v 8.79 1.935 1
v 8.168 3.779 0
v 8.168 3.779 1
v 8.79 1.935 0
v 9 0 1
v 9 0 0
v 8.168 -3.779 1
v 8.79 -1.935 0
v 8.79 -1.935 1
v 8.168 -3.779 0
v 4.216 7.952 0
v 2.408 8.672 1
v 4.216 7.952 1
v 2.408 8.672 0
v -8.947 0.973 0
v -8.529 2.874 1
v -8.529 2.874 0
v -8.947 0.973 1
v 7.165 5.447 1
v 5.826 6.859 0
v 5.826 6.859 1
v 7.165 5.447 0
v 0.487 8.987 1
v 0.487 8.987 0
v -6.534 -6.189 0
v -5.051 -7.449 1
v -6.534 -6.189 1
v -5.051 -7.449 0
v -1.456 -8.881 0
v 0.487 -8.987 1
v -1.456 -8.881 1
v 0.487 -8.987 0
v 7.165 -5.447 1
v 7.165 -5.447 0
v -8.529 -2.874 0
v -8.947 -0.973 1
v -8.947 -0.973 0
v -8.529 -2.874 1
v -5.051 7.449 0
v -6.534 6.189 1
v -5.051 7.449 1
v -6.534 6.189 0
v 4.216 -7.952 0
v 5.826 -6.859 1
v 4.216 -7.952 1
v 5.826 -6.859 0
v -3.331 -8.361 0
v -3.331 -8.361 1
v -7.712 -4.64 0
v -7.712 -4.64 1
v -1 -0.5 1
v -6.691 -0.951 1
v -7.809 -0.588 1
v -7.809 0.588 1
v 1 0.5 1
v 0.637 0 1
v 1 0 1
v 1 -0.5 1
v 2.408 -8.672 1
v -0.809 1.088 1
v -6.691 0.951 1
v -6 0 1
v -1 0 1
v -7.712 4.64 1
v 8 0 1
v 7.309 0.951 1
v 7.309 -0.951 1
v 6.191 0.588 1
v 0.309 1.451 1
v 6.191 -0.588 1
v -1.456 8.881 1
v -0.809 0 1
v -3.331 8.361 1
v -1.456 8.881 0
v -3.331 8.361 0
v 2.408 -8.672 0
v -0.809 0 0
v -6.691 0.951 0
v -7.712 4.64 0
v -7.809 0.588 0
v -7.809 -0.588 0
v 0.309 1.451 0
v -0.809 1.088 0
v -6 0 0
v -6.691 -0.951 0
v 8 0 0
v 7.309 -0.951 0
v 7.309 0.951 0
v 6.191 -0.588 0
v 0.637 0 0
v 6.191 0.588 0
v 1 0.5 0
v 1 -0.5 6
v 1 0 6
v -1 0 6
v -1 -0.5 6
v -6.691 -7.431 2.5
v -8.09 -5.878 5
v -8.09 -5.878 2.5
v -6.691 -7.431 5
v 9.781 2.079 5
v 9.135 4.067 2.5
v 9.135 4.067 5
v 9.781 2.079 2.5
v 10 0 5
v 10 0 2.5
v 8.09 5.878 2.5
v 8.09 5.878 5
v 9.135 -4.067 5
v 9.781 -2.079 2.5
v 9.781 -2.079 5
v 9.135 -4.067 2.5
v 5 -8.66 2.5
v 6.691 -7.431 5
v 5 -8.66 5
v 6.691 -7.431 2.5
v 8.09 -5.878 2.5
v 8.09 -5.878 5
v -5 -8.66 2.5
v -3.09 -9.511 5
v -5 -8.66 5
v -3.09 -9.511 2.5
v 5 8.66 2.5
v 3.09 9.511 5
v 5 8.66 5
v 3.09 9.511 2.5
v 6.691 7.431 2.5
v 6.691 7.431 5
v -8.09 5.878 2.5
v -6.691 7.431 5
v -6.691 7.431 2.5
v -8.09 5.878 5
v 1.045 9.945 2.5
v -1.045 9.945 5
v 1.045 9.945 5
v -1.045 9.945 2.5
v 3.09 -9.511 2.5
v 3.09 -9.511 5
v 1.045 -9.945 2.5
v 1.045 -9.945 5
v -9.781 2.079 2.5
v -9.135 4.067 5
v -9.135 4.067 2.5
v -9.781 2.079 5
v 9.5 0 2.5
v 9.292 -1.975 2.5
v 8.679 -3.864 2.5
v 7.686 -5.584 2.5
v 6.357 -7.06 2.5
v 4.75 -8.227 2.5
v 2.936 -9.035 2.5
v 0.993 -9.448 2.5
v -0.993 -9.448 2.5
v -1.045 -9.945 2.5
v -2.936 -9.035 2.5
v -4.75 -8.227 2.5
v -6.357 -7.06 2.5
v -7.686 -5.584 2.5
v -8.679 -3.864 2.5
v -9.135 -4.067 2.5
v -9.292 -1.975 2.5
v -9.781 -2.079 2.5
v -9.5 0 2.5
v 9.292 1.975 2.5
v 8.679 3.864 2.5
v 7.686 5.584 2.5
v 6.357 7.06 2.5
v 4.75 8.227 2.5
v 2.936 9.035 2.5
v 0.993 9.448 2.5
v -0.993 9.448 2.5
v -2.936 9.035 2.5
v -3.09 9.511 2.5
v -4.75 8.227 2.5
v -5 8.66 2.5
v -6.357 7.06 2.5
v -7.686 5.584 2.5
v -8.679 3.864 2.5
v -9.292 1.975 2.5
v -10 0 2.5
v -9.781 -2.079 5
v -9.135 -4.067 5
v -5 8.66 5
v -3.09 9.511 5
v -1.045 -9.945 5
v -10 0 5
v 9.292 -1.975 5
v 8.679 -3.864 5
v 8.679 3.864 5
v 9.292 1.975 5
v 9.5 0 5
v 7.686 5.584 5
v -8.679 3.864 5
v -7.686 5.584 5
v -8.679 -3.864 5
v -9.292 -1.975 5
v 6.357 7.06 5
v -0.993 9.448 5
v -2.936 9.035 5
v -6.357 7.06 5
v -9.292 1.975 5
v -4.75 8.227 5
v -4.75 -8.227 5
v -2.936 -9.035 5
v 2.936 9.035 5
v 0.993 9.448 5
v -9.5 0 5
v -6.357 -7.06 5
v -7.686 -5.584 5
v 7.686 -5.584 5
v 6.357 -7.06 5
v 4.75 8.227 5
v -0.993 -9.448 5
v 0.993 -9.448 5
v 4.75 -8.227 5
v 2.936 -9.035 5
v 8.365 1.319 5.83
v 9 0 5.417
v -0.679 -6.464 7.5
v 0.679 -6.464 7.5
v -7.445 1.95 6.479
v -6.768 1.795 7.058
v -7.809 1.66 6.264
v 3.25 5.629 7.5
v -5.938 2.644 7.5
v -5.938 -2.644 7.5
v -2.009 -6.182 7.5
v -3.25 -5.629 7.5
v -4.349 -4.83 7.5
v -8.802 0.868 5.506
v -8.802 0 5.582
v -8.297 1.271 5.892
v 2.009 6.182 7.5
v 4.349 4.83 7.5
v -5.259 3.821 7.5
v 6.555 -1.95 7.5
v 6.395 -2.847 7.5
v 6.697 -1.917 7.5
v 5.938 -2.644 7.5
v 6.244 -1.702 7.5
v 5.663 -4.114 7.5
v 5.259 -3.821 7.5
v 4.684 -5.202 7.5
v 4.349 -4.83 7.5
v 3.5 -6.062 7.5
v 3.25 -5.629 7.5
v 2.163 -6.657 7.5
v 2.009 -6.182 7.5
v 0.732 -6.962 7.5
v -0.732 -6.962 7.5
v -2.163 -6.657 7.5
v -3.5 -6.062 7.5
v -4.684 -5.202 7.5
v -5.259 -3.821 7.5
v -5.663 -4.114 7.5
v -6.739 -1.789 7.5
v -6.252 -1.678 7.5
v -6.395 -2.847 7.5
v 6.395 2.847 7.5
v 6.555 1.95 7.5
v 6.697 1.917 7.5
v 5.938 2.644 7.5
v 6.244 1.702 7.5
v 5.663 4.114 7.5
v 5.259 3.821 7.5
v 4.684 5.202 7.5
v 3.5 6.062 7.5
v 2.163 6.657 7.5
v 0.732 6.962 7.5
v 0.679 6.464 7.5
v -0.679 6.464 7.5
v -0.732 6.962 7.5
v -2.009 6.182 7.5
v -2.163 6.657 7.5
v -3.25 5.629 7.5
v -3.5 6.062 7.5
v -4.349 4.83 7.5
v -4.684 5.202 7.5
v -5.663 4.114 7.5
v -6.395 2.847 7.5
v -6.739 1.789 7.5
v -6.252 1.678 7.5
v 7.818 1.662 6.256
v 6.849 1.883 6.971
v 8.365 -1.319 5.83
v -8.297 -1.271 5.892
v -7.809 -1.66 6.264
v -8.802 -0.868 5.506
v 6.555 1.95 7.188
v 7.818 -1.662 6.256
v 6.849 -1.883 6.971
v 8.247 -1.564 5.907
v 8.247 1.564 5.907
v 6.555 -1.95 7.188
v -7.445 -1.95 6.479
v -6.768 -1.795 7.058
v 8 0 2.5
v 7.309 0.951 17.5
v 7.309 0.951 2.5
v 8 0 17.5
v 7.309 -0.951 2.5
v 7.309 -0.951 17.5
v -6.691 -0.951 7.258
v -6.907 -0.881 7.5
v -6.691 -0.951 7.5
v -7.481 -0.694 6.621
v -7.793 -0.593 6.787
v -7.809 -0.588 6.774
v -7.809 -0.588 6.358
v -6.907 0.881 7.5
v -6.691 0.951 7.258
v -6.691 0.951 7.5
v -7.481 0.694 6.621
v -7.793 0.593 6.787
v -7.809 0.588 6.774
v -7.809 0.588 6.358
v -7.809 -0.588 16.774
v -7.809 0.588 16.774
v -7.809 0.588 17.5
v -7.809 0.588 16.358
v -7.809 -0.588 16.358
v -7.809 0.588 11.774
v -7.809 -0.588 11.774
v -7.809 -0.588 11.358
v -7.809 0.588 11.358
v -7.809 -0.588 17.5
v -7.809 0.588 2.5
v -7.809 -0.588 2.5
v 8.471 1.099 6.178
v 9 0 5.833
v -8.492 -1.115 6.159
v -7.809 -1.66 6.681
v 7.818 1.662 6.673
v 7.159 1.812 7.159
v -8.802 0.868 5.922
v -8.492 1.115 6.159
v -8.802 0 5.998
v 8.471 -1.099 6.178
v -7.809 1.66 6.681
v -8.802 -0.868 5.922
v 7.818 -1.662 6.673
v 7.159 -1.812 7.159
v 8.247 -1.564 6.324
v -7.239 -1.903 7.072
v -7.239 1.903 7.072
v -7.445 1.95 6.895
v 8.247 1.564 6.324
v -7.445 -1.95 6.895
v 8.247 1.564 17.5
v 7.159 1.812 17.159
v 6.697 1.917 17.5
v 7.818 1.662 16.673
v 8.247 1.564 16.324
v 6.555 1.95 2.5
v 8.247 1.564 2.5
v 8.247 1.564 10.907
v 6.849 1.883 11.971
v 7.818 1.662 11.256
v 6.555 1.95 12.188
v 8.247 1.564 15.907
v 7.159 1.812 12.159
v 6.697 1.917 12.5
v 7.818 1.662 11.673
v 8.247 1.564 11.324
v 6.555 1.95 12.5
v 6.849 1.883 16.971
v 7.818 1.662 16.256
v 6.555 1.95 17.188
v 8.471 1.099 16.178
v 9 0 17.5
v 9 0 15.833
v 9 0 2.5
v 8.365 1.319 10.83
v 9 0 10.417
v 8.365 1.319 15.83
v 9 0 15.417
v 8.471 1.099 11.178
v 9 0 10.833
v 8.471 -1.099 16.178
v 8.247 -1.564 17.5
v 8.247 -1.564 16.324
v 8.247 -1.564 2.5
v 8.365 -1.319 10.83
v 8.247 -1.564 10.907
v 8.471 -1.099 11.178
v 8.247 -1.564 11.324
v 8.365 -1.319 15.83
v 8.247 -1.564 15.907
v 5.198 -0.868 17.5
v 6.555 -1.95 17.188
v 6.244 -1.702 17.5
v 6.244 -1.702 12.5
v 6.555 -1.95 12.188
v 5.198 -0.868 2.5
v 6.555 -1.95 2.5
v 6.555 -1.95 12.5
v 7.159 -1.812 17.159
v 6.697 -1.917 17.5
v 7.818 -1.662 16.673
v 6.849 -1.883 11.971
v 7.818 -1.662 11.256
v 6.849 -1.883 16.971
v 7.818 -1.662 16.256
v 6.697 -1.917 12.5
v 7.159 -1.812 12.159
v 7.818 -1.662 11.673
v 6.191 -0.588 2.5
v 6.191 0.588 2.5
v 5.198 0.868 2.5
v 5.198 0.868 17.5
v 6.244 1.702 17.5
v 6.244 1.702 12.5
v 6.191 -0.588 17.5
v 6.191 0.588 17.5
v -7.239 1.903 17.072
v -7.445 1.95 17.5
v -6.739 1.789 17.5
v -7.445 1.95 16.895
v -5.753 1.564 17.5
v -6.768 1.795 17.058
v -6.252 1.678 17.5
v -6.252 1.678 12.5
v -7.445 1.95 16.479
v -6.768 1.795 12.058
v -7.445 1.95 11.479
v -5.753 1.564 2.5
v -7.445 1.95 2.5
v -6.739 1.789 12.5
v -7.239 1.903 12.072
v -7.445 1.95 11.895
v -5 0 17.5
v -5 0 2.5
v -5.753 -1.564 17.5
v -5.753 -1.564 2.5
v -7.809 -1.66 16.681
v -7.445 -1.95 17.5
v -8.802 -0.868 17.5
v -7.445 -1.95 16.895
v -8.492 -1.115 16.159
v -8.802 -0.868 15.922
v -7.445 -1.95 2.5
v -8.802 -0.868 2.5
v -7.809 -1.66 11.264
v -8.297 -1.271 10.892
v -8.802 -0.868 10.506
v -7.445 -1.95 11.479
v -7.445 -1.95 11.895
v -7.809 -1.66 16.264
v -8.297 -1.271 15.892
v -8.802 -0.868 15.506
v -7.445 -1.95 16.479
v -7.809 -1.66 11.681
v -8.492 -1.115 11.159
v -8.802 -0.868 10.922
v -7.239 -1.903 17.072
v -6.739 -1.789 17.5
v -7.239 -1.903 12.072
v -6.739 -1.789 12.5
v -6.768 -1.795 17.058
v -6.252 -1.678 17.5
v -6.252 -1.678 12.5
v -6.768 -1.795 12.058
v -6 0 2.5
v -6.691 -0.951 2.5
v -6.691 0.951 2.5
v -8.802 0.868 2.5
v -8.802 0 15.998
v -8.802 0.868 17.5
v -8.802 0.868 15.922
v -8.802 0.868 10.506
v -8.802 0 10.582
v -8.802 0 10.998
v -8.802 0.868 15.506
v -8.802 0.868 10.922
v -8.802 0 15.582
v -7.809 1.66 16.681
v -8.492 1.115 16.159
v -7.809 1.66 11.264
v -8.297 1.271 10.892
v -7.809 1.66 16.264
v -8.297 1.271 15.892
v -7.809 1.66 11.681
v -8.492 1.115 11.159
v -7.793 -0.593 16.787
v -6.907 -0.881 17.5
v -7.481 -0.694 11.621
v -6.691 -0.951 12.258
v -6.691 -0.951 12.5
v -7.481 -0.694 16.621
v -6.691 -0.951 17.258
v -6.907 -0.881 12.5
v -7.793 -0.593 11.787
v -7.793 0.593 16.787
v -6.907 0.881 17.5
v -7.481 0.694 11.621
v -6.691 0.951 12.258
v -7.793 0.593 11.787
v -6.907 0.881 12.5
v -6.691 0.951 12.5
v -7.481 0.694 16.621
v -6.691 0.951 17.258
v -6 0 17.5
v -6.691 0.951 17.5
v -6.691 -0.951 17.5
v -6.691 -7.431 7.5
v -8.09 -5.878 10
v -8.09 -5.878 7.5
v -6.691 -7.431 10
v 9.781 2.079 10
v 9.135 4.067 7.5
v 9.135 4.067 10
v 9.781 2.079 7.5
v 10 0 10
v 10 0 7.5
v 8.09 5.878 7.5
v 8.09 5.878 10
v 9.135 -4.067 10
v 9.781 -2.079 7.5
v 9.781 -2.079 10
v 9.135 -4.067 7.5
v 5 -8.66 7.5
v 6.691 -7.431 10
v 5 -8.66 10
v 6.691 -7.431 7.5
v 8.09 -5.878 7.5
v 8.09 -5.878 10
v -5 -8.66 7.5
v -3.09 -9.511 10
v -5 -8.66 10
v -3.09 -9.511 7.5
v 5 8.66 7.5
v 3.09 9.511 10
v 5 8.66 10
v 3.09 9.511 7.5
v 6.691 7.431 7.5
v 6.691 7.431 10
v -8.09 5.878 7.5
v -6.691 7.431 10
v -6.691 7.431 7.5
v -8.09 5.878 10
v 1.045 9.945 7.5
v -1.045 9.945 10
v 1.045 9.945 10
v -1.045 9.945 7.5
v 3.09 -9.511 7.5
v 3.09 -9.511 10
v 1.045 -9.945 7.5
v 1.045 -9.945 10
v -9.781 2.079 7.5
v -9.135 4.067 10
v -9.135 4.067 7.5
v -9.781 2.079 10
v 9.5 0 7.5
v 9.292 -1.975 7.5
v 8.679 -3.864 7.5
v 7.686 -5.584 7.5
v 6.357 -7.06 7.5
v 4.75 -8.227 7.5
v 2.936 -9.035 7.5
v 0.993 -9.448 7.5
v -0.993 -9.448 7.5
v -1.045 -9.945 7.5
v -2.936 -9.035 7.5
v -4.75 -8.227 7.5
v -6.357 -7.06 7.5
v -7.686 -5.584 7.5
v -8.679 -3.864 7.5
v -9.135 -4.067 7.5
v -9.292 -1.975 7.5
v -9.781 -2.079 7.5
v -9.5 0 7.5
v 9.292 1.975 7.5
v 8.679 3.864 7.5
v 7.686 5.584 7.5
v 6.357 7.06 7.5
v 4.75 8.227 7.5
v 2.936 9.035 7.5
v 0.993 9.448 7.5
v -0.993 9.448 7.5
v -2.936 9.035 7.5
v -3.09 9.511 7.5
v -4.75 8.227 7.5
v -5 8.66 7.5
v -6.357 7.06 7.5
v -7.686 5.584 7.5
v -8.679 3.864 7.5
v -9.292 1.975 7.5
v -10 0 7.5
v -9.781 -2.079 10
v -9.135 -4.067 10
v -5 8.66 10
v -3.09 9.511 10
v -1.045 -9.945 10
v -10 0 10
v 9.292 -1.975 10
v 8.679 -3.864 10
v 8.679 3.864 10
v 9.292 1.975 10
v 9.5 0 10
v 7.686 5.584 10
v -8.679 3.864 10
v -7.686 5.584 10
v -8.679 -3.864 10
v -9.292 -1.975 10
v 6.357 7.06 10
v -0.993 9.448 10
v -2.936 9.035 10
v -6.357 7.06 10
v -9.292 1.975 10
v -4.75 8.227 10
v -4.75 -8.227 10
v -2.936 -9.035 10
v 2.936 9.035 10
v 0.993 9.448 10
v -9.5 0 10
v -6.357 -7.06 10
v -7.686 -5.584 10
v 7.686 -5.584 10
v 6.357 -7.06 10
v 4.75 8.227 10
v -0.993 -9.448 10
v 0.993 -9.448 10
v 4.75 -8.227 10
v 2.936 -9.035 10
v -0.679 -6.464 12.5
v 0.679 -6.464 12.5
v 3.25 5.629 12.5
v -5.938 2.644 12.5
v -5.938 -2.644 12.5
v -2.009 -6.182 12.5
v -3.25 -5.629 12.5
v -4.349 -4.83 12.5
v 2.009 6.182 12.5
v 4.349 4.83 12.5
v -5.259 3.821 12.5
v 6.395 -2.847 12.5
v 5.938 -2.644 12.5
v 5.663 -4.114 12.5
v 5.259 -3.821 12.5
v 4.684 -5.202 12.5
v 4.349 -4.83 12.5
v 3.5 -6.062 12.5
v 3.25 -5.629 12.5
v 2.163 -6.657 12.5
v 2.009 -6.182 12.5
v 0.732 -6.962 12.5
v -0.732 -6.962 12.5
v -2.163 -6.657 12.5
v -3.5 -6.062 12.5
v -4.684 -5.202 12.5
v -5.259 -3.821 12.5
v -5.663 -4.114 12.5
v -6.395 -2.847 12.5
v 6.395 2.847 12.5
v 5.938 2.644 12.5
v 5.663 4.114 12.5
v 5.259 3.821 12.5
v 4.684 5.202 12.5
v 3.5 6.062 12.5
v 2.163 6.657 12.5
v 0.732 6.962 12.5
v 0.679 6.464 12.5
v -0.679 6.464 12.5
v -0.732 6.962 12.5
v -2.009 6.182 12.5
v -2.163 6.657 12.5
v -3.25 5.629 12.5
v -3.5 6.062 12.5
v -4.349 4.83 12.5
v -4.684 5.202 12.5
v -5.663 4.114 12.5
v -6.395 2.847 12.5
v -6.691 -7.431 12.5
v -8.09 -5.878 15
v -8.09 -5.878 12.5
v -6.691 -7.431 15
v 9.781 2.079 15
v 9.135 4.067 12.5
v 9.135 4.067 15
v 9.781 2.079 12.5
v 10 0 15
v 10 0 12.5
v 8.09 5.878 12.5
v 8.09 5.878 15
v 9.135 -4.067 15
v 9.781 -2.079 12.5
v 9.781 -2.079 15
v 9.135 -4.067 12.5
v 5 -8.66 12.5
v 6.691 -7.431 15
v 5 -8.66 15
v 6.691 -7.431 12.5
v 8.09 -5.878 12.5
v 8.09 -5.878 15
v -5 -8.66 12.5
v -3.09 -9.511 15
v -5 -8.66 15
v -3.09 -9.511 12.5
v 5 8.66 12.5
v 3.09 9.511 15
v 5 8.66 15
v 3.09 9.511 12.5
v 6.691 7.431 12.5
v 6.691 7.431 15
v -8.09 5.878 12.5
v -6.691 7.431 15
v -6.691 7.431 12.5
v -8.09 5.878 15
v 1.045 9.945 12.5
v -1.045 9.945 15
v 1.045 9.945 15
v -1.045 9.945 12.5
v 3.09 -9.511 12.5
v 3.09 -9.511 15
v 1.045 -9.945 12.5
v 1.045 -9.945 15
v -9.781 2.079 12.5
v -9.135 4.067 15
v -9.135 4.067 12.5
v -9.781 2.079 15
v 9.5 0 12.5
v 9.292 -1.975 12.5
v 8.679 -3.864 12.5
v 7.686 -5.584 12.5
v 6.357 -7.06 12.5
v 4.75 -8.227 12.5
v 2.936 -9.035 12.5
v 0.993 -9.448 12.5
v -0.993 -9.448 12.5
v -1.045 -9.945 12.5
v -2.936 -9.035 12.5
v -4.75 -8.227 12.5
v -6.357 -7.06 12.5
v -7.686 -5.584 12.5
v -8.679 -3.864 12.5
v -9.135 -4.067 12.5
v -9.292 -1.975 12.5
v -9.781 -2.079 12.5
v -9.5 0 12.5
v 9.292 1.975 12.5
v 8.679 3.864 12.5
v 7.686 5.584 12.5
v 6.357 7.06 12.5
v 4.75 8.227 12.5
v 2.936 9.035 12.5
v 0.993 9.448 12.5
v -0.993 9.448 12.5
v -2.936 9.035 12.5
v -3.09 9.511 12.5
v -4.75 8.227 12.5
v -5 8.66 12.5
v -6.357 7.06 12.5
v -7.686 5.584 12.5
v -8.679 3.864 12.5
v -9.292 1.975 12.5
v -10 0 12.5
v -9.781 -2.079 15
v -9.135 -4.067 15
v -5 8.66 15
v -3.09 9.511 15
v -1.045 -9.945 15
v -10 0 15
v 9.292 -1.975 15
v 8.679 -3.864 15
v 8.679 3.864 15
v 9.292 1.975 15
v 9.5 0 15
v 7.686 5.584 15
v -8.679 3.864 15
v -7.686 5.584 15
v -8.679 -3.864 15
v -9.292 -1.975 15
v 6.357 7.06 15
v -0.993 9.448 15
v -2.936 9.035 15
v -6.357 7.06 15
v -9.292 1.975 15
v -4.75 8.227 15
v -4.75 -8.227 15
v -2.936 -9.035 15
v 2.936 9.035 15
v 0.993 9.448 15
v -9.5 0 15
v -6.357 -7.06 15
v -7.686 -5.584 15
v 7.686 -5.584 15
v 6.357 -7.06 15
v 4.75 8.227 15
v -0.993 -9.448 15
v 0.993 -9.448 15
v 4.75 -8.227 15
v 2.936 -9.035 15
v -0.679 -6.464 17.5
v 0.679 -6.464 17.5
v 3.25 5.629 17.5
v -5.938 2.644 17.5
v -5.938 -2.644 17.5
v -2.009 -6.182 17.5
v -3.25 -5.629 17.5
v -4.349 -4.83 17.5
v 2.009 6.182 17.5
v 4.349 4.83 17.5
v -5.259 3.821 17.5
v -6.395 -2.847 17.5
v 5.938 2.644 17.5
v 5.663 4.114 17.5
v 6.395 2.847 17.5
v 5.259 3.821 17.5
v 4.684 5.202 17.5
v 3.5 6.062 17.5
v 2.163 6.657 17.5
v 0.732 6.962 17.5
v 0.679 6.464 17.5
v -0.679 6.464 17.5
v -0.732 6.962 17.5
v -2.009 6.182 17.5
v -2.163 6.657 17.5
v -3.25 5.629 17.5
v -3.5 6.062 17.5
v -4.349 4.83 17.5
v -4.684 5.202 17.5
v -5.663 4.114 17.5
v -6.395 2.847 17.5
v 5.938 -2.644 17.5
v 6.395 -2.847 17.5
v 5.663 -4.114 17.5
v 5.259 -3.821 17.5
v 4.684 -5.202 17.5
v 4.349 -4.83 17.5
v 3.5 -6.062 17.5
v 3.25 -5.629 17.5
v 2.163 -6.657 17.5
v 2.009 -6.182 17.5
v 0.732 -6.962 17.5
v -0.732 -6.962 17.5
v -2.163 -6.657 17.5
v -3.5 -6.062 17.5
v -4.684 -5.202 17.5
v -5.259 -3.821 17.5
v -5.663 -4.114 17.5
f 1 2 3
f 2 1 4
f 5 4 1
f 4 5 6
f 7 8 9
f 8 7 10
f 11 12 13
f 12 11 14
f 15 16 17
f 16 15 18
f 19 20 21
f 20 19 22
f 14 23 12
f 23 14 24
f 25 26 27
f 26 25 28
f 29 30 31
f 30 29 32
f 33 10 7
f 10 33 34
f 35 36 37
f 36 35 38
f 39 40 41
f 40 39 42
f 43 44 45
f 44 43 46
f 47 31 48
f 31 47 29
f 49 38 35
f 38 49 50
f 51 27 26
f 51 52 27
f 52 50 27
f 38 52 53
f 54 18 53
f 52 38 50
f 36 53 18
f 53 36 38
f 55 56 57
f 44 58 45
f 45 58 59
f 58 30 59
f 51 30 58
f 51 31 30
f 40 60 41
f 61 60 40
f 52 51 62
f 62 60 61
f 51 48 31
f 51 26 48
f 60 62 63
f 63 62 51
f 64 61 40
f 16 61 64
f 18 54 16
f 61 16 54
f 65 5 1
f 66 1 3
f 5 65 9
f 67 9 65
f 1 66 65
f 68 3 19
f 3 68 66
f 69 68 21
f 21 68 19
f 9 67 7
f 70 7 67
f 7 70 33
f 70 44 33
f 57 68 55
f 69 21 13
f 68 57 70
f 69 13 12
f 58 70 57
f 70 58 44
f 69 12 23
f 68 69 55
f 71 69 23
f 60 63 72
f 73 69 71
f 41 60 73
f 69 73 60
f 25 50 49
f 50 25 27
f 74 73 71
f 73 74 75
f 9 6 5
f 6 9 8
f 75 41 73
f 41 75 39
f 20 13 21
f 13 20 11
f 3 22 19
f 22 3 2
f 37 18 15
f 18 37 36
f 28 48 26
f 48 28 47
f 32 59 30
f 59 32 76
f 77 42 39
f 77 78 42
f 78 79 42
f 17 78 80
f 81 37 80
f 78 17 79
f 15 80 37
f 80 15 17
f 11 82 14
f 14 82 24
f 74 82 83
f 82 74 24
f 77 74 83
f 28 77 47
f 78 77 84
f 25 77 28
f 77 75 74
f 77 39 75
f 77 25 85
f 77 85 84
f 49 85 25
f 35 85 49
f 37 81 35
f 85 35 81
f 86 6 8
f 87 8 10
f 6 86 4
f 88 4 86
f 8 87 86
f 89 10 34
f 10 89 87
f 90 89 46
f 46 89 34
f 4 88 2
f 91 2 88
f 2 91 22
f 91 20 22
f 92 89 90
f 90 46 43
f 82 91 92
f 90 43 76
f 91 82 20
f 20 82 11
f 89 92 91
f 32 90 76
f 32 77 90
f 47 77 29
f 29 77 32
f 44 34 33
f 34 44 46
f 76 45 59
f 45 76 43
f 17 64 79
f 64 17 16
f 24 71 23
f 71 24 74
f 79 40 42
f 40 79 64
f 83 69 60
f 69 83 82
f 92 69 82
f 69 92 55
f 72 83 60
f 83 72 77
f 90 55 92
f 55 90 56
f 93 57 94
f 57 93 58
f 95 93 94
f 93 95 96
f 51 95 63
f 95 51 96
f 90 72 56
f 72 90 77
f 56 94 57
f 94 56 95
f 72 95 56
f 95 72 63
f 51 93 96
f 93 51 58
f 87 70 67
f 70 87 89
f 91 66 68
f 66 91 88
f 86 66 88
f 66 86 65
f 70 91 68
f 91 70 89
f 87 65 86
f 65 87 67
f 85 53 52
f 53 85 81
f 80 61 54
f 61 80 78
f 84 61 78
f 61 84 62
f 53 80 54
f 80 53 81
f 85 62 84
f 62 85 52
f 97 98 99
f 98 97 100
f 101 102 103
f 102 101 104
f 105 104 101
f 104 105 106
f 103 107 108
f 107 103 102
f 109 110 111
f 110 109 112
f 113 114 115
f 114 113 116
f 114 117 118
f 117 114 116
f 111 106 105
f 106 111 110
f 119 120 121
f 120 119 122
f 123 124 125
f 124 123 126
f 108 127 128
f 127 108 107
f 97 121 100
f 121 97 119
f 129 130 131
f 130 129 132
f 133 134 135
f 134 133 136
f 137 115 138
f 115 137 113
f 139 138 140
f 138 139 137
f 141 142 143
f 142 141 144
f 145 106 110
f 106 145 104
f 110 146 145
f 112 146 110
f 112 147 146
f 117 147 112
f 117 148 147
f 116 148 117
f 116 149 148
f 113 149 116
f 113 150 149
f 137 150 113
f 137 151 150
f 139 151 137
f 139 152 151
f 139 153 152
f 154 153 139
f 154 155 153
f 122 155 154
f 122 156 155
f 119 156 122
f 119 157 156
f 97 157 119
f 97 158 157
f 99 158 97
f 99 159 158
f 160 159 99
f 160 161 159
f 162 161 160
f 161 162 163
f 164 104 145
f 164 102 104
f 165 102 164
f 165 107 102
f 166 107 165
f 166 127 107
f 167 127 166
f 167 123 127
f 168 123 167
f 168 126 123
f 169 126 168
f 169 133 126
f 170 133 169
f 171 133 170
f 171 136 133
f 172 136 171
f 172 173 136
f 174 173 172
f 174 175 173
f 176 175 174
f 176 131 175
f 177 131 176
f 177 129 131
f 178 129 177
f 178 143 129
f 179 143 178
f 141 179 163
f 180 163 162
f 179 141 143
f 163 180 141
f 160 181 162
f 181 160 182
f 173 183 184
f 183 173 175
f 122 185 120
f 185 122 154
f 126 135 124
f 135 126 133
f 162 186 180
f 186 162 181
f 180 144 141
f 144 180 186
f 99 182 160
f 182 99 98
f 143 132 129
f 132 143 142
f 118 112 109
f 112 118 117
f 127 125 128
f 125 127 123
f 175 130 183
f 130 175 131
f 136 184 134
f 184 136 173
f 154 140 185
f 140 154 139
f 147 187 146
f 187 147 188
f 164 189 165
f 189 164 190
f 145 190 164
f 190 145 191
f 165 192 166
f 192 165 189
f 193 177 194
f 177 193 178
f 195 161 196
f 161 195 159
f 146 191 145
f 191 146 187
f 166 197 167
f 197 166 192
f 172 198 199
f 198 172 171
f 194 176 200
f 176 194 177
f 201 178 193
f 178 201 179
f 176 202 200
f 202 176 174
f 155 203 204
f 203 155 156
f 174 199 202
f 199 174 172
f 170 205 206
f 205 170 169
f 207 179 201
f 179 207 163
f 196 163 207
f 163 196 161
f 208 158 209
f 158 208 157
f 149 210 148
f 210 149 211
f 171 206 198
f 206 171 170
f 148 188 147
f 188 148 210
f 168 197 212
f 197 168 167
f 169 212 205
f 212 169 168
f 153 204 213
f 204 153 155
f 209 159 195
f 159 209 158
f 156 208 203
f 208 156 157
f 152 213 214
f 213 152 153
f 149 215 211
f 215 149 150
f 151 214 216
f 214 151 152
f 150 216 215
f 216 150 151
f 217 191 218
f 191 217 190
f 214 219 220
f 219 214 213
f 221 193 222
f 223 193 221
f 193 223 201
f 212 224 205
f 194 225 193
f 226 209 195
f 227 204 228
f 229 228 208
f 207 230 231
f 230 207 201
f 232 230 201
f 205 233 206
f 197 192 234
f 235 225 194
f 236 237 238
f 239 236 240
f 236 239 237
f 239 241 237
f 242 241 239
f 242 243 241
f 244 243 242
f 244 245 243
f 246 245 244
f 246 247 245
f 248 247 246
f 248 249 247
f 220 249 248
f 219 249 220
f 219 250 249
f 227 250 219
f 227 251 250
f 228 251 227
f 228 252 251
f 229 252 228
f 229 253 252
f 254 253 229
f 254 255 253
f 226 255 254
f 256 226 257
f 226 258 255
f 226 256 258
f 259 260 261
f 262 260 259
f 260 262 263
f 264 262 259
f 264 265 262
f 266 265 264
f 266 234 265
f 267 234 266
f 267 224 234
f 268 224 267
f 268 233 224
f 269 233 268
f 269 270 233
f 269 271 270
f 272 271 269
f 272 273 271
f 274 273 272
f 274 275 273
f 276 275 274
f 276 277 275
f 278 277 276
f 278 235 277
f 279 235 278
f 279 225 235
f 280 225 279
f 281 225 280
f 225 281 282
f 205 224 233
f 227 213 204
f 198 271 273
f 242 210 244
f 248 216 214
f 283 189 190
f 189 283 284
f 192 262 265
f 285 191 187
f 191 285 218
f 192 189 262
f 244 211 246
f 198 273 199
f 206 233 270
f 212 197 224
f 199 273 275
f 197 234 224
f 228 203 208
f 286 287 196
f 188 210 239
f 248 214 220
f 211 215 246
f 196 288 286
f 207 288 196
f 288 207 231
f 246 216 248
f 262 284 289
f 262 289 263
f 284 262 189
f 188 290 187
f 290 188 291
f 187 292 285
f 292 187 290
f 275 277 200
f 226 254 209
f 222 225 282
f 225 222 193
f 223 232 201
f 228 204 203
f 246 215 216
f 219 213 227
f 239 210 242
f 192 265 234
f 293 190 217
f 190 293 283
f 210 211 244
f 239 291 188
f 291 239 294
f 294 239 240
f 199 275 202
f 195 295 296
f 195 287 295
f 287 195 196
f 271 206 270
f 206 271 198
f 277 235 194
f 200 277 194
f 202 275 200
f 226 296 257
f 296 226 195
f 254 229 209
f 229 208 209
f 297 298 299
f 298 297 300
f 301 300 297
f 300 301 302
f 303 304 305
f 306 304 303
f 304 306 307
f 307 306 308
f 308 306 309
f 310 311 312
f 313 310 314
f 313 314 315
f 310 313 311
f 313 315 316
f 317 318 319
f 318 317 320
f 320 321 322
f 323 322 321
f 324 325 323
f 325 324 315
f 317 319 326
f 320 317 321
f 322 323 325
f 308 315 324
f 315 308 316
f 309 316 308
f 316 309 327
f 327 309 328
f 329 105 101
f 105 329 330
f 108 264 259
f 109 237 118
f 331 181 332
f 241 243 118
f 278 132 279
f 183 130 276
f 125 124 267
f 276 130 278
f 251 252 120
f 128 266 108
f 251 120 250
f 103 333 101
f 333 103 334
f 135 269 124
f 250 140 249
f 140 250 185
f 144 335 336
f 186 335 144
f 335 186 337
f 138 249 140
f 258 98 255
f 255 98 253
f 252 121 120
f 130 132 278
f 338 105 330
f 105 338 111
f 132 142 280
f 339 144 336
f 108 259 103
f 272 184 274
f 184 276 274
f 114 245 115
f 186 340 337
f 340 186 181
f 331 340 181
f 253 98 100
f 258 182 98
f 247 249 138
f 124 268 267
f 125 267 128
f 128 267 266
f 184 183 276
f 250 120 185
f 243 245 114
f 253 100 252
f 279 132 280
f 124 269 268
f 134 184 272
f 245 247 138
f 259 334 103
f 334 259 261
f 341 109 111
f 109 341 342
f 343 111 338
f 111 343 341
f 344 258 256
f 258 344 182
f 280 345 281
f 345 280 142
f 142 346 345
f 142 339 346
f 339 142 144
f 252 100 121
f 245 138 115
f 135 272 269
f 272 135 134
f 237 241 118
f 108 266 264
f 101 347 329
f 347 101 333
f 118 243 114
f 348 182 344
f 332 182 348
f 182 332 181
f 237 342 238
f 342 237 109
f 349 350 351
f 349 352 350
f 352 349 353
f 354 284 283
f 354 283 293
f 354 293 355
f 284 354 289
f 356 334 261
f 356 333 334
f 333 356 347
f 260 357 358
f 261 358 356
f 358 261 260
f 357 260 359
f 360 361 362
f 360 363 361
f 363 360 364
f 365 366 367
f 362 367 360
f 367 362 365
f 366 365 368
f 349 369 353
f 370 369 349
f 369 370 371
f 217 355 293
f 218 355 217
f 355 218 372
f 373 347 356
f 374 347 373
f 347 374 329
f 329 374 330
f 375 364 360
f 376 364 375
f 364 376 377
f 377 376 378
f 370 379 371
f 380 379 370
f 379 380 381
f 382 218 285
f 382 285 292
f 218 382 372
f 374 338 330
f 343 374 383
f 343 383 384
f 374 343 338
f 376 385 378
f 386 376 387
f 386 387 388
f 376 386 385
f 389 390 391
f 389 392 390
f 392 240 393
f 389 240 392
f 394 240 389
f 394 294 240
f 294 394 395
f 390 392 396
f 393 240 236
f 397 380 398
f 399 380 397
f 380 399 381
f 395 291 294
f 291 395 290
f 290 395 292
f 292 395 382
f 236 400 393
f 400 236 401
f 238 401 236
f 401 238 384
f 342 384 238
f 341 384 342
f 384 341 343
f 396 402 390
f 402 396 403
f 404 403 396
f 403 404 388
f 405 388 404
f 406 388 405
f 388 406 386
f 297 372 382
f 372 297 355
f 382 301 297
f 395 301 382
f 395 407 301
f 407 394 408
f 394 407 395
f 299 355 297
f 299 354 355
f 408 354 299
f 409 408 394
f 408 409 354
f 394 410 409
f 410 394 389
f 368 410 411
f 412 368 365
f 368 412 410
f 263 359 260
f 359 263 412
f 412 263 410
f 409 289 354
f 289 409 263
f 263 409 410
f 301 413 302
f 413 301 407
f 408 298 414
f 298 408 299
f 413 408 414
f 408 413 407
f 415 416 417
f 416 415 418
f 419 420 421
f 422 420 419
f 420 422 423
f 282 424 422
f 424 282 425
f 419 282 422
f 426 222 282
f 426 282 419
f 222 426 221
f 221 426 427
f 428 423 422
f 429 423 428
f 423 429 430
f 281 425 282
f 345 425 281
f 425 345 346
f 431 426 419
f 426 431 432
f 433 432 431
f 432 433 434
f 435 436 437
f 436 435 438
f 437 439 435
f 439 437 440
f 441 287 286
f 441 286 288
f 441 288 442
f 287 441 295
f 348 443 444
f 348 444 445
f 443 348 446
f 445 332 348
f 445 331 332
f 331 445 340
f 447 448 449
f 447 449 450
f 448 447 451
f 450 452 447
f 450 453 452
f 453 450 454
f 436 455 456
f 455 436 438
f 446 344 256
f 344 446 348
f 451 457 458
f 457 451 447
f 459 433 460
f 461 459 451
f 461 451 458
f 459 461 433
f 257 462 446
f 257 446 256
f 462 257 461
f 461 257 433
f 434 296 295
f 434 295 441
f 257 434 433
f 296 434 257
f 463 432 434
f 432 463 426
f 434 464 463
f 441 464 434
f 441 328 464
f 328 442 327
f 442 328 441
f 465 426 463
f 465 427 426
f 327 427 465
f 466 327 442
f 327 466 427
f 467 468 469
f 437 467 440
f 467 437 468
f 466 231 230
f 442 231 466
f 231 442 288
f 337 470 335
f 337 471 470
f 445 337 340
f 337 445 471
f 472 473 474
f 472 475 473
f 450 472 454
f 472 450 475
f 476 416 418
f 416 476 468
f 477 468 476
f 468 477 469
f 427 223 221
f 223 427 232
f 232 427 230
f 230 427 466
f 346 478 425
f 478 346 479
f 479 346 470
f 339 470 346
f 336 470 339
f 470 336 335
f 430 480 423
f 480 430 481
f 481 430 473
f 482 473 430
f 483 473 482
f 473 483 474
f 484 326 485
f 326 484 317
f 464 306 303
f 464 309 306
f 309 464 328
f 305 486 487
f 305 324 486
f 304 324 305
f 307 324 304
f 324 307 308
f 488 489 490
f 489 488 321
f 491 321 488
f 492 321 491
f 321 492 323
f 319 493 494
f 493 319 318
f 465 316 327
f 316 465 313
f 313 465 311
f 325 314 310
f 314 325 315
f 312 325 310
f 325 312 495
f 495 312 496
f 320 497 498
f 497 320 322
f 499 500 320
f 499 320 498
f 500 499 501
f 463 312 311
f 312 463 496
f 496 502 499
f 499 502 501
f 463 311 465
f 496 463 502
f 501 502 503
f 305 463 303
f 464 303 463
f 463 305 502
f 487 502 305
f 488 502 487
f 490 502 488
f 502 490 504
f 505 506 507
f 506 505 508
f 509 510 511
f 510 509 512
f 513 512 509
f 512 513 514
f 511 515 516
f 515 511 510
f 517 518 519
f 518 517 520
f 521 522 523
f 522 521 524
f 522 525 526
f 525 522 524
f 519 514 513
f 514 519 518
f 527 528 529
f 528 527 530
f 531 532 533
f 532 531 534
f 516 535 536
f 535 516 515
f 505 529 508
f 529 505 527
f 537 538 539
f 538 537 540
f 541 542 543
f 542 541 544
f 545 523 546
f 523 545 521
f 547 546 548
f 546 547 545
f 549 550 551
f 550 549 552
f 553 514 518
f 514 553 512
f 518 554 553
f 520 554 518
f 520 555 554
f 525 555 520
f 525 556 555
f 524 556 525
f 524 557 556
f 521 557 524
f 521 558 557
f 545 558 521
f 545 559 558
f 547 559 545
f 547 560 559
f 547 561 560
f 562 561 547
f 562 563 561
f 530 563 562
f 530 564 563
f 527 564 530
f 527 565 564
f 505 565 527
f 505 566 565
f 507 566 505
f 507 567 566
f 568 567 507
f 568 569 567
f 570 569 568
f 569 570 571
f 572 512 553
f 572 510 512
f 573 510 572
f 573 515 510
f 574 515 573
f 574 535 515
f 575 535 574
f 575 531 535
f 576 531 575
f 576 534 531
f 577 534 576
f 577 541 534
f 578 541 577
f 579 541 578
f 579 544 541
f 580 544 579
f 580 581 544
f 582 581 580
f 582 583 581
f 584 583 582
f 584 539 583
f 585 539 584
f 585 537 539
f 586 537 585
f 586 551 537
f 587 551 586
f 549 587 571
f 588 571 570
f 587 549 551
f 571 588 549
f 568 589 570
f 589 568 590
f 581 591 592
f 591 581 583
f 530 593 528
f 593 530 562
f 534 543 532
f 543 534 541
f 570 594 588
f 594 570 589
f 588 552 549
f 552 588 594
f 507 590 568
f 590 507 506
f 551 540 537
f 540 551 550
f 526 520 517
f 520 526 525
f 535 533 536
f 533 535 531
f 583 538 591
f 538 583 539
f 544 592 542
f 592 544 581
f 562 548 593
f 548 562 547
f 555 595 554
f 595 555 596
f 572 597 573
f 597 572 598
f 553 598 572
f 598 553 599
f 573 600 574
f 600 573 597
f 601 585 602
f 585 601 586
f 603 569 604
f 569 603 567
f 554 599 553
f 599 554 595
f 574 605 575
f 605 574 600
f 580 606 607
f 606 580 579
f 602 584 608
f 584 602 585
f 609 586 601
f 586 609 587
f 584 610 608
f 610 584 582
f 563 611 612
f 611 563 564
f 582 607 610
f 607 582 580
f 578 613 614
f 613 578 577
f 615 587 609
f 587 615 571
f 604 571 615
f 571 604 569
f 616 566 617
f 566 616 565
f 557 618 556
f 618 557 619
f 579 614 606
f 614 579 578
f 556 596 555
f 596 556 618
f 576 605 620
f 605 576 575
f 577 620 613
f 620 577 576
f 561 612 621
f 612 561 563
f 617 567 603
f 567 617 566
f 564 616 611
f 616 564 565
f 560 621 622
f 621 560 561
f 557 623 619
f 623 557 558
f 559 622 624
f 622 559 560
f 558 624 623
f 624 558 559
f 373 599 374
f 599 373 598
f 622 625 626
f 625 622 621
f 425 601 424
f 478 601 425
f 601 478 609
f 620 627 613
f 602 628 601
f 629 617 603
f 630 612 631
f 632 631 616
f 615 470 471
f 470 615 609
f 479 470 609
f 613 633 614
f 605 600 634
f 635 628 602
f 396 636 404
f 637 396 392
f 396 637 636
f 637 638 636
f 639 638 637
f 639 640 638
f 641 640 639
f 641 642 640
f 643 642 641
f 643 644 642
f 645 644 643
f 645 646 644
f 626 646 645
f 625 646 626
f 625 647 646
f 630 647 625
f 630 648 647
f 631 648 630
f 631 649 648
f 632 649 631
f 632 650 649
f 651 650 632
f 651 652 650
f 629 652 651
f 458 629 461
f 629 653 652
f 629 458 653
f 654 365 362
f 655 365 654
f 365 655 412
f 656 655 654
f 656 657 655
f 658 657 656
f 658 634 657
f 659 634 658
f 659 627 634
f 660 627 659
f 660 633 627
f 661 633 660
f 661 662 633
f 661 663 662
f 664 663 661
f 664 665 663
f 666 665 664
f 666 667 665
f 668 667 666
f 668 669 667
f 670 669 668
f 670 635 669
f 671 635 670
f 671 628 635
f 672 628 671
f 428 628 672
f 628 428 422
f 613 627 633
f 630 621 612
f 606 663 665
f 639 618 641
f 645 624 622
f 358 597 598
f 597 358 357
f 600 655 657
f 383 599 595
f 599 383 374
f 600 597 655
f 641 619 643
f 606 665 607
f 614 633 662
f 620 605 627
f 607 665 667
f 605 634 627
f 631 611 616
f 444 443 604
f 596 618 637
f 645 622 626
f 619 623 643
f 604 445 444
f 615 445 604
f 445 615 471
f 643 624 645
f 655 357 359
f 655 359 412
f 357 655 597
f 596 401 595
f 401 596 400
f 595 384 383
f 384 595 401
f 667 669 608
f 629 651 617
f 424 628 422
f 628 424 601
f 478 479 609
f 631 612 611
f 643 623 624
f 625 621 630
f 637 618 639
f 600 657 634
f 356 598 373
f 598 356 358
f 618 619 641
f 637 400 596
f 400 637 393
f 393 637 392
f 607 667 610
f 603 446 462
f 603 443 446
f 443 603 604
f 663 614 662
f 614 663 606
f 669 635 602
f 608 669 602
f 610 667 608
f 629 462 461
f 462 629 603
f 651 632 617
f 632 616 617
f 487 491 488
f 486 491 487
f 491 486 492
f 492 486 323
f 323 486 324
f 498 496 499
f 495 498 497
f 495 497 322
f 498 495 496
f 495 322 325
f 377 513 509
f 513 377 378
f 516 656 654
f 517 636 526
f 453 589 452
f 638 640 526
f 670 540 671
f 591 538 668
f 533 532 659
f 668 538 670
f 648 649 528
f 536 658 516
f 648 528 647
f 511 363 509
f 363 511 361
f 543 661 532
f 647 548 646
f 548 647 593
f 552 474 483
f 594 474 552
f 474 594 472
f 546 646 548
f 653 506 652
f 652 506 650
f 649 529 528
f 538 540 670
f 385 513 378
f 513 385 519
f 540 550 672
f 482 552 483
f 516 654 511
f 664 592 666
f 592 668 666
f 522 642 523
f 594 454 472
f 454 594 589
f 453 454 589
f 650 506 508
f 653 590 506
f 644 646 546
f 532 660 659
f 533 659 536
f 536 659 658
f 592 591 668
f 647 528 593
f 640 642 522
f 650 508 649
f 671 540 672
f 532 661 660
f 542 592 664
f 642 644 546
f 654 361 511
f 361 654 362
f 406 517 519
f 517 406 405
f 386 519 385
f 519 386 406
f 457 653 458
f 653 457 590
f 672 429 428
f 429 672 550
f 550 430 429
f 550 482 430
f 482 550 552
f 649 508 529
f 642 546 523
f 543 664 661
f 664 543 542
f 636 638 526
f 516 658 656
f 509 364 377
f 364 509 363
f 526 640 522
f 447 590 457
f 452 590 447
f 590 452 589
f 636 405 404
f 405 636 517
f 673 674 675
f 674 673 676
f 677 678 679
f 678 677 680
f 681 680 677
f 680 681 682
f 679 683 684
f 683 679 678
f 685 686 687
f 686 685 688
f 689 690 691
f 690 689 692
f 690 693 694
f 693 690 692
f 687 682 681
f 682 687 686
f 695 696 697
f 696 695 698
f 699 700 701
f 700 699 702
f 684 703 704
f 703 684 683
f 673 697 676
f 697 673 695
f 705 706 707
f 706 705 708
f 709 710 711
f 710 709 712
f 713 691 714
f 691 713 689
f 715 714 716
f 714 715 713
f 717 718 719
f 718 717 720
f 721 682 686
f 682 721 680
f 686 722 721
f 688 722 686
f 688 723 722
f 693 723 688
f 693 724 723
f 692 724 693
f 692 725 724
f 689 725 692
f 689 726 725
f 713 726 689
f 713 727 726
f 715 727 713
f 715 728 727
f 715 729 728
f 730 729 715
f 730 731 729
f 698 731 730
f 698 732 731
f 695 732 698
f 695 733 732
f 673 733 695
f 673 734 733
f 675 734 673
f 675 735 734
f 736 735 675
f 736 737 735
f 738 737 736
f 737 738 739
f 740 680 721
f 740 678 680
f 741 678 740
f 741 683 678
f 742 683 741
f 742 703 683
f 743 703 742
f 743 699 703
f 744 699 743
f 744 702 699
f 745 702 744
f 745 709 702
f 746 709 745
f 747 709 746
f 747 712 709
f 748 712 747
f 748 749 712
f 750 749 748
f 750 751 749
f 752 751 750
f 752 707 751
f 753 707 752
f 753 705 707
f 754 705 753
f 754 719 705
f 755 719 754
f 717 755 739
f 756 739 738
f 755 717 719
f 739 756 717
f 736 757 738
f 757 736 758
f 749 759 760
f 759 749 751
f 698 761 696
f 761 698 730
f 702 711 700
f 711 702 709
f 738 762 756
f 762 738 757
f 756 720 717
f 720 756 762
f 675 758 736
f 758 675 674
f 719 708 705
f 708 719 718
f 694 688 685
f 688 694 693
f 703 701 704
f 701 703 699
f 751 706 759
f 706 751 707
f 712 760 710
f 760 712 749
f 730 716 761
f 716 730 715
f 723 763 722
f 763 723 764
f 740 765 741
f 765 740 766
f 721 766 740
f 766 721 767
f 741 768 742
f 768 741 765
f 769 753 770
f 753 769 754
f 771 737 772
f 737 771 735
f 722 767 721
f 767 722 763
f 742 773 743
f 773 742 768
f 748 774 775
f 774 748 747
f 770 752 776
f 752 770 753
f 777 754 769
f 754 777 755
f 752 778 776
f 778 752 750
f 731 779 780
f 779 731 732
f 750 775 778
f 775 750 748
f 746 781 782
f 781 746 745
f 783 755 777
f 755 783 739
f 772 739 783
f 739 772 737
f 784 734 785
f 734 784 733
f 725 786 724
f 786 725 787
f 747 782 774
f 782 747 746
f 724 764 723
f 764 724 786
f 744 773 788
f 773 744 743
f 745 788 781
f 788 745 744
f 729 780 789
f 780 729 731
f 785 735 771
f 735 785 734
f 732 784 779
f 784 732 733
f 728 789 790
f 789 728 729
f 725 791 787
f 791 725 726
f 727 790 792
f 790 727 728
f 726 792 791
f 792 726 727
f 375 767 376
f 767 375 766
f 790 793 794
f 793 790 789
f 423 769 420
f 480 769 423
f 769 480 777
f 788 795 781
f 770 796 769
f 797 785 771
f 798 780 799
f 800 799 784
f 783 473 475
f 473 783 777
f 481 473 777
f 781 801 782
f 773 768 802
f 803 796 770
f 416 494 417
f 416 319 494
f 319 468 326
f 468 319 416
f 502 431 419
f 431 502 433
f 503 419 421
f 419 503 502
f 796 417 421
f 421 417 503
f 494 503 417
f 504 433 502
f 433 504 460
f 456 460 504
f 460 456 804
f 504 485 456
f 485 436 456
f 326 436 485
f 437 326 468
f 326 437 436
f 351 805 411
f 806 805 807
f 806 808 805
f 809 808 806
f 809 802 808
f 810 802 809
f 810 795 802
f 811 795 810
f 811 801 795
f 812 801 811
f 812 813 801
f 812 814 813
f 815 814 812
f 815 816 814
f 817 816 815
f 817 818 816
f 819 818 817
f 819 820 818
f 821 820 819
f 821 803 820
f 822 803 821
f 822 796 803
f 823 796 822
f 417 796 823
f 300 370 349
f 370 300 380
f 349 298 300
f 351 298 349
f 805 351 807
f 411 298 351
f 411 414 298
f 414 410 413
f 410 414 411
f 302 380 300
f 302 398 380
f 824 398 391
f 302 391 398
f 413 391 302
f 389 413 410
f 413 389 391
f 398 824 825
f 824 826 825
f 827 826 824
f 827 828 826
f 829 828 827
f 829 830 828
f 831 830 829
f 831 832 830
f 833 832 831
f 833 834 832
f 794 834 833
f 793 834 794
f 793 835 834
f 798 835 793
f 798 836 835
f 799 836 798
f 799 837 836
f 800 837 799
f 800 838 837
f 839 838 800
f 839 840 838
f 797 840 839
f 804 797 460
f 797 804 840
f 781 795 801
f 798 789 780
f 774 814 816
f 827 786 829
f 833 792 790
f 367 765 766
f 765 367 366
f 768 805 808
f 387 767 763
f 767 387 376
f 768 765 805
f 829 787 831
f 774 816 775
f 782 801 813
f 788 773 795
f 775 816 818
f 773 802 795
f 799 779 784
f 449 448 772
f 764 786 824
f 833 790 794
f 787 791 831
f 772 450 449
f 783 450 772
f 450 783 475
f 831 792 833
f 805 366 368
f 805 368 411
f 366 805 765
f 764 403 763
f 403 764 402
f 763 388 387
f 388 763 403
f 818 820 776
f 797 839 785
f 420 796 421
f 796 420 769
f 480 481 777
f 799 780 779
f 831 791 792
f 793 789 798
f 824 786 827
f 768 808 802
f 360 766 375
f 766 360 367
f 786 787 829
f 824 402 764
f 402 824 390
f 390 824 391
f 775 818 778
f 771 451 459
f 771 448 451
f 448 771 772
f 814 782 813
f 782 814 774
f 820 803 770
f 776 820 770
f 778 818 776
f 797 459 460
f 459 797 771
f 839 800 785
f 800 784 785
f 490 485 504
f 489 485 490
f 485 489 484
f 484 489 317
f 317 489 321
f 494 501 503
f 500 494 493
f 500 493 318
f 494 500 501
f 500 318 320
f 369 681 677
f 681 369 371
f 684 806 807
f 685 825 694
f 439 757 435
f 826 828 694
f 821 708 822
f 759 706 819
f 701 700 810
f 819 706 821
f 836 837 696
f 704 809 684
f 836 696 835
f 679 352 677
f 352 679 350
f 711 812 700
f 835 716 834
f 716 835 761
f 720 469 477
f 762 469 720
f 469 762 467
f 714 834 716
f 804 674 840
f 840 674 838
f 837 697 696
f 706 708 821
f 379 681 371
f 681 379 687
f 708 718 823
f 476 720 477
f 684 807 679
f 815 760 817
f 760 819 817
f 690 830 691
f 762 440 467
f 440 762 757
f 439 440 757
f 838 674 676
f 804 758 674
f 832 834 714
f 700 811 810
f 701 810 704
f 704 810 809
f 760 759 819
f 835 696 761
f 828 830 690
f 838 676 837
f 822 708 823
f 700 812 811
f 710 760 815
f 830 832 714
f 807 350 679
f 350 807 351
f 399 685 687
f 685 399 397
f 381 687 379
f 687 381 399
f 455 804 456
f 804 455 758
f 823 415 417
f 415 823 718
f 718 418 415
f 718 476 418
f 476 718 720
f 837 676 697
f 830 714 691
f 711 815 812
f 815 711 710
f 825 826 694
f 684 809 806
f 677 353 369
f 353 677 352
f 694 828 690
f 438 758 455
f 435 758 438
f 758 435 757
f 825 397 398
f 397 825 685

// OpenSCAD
width=10;
height=5;
stick_width=2;

module dht22() {
    color("red") cube([1.5,0.78,2.5]);
}

module bottom_plate() {
    difference() {
        union() {
            translate([-1, -0.5, 0]) cube([2, 0.5, 6]);
            difference() {
                cylinder(h=1,r1=width*0.9,r2=width*0.9);
                translate([0, 0.5, 0]) cylinder(h=height,r1=width/10,r2=width/10);
            }
        }
        translate([offset, 0, 0]) cylinder(h=height,r1=stick_width/2,r2=stick_width/2);
        translate([-offset, 0, 0]) cylinder(h=height,r1=stick_width/2,r2=stick_width/2);
    }
}

module ring(width=10, height=3, wall=0.5, res=50, closed=false) {
    inner_width = width*0.7;
    difference() {
        cylinder(h=height,r1=width,r2=width);
        cylinder(h=height,r1=width-wall*2,r2=width-wall*2);
    }
    
    translate([0, 0, height])
        difference() {
            cylinder(h=height,r1=width,r2=inner_width);
            if(!closed){
                cylinder(h=height,r1=width-wall*2,r2=inner_width-wall*2);
                translate([offset, 0, 0]) cylinder(h=height,r1=stick_width/2,r2=stick_width/2);
                translate([-offset, 0, 0]) cylinder(h=height,r1=stick_width/2,r2=stick_width/2);
            }
        }
}

module stick(height=1) {
    difference () {
        cylinder(h=height,r1=width,r2=width);
        cylinder(h=height,r1=width/2,r2=width/2);
    };
}

module cap() {
    difference() {
        cylinder(h=height*2,r1=width,r2=0);
        translate([0, 0, -height/2])
        cylinder(h=height*2,r1=width,r2=0);
    }
}


bottom_plate();
%translate([-0.75, 0, 3]) dht22();

count=3;
offset=width*0.7;
translate([0, 0, height/2])
for(y=[0:height:count*height-1]) {
    translate([0, 0, y]) ring(width=width, height=height/2, wall=0.25);
    translate([offset, 0, y]) stick(width=stick_width, height=height);
    translate([-offset, 0, y]) stick(width=stick_width, height=height);
}

cap_y=count*height+height/2;
%translate([0, 0, cap_y])
union() {
    ring(width=width, height=height/2, wall=0.25, closed=true);
    translate([offset, 0, 0]) stick(width=stick_width, height=height/2);
    translate([-offset, 0, 0]) stick(width=stick_width, height=height/2);
}
